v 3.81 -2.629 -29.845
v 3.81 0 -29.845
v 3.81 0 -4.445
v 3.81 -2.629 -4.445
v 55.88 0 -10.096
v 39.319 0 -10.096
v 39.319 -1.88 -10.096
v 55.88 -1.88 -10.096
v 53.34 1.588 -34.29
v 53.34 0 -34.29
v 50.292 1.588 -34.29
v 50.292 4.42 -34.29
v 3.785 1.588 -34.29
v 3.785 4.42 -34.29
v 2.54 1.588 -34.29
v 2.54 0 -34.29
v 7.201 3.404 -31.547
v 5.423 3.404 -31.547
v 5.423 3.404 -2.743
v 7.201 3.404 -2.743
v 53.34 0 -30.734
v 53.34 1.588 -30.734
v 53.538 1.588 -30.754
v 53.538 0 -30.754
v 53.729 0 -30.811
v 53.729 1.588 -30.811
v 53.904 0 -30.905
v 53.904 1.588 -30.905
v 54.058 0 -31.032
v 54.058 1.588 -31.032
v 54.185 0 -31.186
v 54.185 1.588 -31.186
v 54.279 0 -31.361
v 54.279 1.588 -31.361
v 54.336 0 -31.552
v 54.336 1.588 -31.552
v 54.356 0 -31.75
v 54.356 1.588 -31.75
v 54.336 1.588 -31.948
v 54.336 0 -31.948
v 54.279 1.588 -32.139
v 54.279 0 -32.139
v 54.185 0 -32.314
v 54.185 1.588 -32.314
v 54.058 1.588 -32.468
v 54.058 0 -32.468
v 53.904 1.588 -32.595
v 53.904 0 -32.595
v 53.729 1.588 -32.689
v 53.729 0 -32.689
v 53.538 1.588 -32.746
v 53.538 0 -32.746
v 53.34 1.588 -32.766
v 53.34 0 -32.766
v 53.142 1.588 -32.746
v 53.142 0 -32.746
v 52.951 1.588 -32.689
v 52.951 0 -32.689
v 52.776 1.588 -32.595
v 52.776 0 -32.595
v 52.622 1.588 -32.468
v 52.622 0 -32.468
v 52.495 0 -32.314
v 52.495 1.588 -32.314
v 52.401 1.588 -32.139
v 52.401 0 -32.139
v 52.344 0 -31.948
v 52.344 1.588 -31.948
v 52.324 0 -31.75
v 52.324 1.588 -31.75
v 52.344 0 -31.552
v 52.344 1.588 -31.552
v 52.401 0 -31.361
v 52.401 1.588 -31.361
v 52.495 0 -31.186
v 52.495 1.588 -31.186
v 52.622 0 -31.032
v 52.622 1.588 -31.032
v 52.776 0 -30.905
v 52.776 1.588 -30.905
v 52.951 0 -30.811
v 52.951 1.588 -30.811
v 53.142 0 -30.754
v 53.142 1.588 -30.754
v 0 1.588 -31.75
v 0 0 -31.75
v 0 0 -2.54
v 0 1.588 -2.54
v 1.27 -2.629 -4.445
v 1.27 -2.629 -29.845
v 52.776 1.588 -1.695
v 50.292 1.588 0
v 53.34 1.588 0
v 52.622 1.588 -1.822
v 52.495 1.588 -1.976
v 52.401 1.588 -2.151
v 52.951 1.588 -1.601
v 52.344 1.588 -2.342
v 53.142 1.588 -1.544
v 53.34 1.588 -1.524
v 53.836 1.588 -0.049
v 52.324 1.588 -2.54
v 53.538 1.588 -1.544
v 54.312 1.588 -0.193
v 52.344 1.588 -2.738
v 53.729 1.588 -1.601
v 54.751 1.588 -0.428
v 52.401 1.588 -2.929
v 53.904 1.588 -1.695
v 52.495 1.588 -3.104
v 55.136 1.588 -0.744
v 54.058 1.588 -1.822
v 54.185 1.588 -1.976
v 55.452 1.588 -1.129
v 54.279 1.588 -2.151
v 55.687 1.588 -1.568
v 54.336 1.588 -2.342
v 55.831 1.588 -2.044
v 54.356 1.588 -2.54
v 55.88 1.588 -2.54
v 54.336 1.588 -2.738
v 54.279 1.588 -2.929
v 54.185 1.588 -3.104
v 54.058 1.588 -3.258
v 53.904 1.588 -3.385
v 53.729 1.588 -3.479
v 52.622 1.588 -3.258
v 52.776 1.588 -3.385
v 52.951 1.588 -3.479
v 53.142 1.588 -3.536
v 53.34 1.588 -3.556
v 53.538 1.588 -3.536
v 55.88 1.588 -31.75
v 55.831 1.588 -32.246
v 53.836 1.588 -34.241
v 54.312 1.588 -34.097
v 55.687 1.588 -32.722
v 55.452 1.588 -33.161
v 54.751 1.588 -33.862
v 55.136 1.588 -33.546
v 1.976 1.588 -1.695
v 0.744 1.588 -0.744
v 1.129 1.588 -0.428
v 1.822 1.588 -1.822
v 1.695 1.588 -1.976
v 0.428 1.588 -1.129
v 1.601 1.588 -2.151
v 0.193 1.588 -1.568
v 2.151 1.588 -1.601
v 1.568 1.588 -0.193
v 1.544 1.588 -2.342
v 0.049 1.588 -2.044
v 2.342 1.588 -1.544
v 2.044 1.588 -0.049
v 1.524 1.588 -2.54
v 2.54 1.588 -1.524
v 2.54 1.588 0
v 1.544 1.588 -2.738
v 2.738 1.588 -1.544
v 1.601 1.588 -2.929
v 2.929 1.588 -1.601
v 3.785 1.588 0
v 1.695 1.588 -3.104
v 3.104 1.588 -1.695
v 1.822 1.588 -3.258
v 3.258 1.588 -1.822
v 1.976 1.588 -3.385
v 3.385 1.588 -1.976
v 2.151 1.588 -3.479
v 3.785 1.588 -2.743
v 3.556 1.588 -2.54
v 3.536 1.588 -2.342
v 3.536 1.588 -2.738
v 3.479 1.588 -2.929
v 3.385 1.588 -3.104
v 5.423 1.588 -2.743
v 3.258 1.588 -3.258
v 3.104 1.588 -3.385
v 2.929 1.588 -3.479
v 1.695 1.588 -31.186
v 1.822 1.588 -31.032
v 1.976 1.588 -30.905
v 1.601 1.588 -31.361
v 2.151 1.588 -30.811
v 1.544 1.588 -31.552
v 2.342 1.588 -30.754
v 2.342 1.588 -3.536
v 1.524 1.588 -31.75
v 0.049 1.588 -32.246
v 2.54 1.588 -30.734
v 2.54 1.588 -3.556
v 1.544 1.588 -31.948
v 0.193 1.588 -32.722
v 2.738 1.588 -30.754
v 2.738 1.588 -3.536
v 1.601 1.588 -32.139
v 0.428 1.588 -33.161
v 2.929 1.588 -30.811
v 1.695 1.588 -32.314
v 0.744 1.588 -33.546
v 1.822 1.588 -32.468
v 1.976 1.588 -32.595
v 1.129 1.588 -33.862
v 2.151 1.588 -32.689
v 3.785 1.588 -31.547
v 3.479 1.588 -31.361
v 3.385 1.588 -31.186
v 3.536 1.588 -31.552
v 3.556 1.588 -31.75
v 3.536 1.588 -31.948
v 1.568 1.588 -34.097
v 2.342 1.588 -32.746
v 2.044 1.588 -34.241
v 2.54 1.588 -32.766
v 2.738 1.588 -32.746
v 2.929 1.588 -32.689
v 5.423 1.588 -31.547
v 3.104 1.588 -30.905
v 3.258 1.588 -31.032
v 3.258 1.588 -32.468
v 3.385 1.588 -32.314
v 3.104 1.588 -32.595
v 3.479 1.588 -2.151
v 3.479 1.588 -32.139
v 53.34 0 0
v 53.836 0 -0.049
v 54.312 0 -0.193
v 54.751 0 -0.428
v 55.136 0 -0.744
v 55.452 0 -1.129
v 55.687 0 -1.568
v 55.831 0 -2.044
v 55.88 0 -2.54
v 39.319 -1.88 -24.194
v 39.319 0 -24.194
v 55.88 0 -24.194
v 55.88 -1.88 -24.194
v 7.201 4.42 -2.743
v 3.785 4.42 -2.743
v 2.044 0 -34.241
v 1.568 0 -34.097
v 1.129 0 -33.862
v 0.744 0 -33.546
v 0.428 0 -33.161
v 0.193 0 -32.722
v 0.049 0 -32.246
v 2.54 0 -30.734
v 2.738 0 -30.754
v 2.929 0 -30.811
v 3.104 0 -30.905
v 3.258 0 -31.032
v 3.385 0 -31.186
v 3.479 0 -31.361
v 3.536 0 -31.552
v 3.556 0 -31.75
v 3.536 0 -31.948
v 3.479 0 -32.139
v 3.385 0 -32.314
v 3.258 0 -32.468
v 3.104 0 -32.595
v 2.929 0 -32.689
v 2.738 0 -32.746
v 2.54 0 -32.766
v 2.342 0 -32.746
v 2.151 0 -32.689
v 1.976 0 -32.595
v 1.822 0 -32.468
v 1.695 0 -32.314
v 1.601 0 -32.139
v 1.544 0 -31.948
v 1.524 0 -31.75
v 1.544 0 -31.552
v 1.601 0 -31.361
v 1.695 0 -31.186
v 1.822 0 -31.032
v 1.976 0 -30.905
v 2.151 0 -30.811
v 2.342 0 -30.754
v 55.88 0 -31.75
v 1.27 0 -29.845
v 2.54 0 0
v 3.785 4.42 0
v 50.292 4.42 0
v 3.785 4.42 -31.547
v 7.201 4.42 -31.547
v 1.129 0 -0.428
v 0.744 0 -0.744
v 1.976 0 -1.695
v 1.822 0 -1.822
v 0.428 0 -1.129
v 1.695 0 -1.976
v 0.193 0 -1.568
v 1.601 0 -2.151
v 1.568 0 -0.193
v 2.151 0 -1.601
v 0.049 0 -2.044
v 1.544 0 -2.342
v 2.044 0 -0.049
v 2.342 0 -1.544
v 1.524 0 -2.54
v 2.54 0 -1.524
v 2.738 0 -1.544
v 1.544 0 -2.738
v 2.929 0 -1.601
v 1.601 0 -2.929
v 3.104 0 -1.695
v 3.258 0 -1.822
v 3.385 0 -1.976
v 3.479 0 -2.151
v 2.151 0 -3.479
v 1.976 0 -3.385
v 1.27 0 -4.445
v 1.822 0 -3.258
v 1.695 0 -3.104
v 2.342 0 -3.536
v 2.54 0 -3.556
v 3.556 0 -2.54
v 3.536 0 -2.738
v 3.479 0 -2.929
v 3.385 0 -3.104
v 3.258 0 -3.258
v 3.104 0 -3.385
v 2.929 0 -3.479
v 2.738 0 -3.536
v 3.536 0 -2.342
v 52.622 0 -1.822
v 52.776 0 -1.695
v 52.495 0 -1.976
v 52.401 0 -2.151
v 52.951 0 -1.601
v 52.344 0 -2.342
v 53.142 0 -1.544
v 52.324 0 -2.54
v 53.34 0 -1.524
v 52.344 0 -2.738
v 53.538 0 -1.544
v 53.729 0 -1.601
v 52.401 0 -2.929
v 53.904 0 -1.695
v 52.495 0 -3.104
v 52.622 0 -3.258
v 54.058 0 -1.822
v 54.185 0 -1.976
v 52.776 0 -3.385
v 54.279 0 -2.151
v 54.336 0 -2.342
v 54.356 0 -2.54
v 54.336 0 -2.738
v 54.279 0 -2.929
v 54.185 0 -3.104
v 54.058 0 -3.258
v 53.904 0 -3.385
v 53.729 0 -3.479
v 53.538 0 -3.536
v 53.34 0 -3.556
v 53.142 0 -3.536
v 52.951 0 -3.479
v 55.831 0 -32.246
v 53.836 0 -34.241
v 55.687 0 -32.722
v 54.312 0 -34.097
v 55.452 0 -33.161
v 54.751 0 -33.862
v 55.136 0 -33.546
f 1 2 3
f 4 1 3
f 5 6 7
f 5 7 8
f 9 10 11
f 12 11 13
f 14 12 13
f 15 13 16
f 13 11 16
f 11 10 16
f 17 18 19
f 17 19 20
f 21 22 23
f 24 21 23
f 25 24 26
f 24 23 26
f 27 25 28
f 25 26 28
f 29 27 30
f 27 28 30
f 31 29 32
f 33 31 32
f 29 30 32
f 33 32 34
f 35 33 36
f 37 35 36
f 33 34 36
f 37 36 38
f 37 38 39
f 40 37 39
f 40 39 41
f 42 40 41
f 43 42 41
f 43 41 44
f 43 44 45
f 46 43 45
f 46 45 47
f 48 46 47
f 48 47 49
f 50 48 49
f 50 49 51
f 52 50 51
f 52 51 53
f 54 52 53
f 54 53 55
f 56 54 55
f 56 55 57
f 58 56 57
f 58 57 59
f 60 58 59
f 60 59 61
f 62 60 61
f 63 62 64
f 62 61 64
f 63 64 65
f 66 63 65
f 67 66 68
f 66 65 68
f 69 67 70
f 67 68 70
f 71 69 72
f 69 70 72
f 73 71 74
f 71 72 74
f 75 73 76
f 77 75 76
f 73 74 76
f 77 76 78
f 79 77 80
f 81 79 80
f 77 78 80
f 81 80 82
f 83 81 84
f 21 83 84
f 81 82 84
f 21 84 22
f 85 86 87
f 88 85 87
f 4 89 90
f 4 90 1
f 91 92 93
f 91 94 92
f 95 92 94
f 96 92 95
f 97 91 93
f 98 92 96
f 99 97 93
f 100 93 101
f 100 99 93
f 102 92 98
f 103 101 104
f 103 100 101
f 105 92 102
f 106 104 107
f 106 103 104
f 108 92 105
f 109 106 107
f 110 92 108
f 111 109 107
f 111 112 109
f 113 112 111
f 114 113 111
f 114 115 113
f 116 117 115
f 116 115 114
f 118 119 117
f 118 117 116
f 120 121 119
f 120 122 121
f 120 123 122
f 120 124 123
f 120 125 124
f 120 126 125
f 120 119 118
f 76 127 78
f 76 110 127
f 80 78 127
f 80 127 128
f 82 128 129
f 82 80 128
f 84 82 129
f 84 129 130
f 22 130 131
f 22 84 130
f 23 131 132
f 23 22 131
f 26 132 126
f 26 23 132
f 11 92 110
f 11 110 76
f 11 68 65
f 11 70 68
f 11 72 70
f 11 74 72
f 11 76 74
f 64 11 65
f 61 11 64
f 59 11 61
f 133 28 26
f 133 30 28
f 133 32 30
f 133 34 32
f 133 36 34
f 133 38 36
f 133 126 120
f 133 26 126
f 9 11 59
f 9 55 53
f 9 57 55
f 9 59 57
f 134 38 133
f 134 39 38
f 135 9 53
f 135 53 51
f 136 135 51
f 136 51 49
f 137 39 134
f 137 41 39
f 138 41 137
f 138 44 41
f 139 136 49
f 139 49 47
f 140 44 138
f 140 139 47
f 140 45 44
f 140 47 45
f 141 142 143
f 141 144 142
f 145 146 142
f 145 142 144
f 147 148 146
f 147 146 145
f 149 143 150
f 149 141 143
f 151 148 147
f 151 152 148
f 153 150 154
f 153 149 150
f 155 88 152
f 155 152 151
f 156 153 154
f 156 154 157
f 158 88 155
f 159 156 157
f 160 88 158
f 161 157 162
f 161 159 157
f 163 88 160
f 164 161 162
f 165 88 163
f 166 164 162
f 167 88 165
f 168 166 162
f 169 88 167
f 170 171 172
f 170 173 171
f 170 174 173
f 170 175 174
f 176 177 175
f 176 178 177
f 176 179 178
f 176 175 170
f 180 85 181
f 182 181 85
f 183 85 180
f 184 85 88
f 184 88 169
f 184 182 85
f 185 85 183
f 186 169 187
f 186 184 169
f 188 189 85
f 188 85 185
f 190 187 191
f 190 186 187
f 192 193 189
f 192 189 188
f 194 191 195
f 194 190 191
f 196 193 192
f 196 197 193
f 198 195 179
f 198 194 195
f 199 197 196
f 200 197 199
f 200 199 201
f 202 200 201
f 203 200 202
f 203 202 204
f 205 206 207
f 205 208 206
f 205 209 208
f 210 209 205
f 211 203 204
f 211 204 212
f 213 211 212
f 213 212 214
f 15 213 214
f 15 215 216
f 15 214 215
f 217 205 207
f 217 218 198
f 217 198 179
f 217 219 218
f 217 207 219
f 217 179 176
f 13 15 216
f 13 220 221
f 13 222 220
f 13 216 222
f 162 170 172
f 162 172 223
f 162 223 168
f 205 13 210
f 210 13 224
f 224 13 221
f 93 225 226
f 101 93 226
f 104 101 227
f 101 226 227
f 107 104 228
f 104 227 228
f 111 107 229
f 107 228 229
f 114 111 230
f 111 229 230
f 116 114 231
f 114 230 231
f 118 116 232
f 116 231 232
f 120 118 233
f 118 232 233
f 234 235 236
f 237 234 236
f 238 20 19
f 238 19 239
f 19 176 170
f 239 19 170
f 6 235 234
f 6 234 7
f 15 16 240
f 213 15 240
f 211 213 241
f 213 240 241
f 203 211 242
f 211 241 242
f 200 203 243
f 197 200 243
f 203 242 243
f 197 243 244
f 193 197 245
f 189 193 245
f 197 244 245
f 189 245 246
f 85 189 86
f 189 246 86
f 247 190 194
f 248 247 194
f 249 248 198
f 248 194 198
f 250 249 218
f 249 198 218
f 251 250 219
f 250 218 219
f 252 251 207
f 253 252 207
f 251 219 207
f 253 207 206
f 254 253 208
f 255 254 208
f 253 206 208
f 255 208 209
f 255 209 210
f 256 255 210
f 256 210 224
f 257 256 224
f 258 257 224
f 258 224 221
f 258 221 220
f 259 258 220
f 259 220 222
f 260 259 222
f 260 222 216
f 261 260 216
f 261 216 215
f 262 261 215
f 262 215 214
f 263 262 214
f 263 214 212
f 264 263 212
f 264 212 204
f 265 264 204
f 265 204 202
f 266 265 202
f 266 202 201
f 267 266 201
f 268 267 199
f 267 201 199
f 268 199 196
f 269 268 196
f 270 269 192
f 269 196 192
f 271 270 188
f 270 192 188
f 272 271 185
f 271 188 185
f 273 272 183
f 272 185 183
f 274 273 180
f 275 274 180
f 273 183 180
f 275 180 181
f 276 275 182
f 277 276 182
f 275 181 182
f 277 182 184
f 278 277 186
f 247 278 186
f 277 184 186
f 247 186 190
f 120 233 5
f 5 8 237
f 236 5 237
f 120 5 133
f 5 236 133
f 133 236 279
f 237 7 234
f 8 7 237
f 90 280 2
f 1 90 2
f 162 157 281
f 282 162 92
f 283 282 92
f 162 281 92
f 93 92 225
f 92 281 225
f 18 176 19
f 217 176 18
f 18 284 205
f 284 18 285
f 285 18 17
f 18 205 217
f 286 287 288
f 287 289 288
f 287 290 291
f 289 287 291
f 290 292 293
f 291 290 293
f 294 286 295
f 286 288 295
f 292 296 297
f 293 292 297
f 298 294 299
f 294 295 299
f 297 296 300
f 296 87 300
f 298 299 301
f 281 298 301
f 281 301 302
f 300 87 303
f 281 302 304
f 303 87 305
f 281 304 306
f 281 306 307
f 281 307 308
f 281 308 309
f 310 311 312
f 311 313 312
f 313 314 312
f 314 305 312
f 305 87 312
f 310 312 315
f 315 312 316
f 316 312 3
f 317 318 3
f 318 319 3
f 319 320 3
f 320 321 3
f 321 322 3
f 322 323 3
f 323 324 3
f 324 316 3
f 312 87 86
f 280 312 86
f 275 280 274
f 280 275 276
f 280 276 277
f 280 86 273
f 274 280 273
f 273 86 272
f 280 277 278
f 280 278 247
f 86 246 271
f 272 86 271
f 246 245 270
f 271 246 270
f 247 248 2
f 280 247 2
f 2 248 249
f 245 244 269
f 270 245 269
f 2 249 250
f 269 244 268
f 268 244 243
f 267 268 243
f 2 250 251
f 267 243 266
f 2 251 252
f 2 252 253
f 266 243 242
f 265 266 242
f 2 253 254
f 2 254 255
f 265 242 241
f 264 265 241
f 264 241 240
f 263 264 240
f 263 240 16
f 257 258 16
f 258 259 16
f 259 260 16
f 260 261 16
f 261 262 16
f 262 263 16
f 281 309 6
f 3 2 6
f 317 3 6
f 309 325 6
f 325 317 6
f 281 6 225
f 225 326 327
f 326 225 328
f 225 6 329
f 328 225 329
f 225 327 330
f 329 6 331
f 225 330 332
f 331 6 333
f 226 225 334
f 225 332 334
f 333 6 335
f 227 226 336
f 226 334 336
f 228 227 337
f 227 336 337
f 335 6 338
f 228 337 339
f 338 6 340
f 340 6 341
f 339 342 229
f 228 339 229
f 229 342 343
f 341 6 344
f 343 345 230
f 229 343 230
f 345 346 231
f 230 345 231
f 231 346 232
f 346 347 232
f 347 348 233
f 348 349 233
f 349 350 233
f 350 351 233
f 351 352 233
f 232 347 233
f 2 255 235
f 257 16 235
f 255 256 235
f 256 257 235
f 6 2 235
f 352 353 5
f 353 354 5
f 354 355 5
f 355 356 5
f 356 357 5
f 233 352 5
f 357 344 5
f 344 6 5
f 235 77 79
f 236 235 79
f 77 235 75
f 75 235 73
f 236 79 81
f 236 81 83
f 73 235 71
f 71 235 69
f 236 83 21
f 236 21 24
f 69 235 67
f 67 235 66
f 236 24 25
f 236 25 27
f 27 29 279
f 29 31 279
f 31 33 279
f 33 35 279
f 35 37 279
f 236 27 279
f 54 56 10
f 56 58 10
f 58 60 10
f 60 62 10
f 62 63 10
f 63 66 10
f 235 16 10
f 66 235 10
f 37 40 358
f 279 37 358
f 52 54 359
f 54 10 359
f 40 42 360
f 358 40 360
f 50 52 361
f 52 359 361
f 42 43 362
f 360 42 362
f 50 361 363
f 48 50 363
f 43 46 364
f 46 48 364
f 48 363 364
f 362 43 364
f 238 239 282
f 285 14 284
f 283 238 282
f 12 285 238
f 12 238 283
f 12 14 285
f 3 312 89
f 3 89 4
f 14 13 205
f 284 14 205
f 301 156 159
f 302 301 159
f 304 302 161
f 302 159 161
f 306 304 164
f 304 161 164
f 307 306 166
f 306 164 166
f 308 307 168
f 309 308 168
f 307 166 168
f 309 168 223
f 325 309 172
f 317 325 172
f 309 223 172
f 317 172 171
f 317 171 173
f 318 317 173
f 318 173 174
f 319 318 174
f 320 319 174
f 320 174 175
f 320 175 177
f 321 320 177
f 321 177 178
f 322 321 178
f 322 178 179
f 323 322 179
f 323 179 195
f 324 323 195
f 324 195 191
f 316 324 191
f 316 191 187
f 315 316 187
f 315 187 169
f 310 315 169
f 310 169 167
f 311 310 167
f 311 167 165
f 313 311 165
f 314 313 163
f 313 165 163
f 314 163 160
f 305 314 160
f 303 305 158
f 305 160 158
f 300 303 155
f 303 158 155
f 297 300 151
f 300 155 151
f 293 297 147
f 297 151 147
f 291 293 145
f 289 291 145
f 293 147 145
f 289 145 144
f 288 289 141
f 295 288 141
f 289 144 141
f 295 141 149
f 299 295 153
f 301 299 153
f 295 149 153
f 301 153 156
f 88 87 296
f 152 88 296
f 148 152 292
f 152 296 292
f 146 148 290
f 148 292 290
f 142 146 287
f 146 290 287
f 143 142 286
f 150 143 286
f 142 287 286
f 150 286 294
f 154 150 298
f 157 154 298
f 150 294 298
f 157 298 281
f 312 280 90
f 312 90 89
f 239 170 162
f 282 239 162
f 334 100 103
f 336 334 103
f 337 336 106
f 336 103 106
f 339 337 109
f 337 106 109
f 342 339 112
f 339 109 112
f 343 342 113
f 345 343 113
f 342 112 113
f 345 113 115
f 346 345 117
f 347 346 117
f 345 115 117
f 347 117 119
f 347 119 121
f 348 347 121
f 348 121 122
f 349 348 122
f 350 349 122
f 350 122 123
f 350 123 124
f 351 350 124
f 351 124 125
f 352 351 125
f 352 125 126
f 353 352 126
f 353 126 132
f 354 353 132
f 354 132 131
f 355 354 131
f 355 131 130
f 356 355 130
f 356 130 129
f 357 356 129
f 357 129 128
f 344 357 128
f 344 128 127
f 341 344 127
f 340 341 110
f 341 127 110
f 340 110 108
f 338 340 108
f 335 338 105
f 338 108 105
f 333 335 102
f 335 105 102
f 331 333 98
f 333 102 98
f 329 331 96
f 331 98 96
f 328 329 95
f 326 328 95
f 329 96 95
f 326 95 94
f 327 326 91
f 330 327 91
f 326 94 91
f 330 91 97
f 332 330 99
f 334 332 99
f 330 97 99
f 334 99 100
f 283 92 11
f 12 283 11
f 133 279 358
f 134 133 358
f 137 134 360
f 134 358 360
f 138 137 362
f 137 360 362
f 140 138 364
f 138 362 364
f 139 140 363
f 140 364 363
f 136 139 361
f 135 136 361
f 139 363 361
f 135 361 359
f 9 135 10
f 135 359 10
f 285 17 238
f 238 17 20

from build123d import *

# Parameters (mm, degrees)
BOSS_EXTRUDE1_DEPTH = 1.5875
BOSS_EXTRUDE2_DEPTH = 2.8321
SKETCH3_W           = 1.778
SKETCH3_H           = 28.8036
BOSS_EXTRUDE3_DEPTH = 1.8161
SKETCH4_R           = 1.016
CUT_EXTRUDE1_DEPTH  = 66.623161235
SKETCH5_W           = 2.54
SKETCH5_H           = 25.4
BOSS_EXTRUDE4_DEPTH = 2.6289
SKETCH6_W           = 16.5608
SKETCH6_H           = 14.097
BOSS_EXTRUDE5_DEPTH = 1.8796


with BuildPart() as part:
    # Sketch1 → Boss-Extrude1 (new body)
    with BuildSketch(Plane(origin=(0, 0, 0), x_dir=(1, 0, 0), z_dir=(0, 1, 0))):
        with BuildLine():
            Line((2.54, 0), (53.34, 0))
            ThreePointArc((53.34, 0), (55.136051224, 0.743948776), (55.88, 2.54))
            Line((55.88, 2.54), (55.88, 31.75))
            ThreePointArc((55.88, 31.75), (55.136051224, 33.546051224), (53.34, 34.29))
            Line((53.34, 34.29), (2.54, 34.29))
            ThreePointArc((2.54, 34.29), (0.743948776, 33.546051224), (0, 31.75))
            Line((0, 31.75), (0, 2.54))
            ThreePointArc((0, 2.54), (0.743948776, 0.743948776), (2.54, 0))
        make_face()
    extrude(amount=BOSS_EXTRUDE1_DEPTH)

    # Sketch2 → Boss-Extrude2 (add)
    with BuildSketch(Plane(origin=(0, 1.5875, 0), x_dir=(1, 0, 0), z_dir=(0, 1, 0))):
        Polygon((50.292, 34.29), (3.7846, 34.29), (3.7846, 31.5468), (7.2009, 31.5468), (7.2009, 2.7432), (3.7846, 2.7432), (3.7846, 0), (50.292, 0), align=None)
    extrude(amount=BOSS_EXTRUDE2_DEPTH)

    # Sketch3 → Boss-Extrude3 (add)
    with BuildSketch(Plane(origin=(0, 1.5875, 0), x_dir=(1, 0, 0), z_dir=(0, 1, 0))):
        with Locations((6.3119, 17.145)):
            Rectangle(SKETCH3_W, SKETCH3_H)
    extrude(amount=BOSS_EXTRUDE3_DEPTH)

    # Sketch4 → Cut-Extrude1 (cut, through all)
    with BuildSketch(Plane(origin=(0, 1.5875, 0), x_dir=(1, 0, 0), z_dir=(0, 1, 0))):
        with Locations(Location((2.54, 31.75, 0), (0, 0, 270))):
            Circle(SKETCH4_R)
        with Locations(Location((2.54, 2.54, 0), (0, 0, 270))):
            Circle(SKETCH4_R)
        with Locations(Location((53.34, 31.75, 0), (0, 0, 270))):
            Circle(SKETCH4_R)
        with Locations(Location((53.34, 2.54, 0), (0, 0, 270))):
            Circle(SKETCH4_R)
    extrude(amount=-CUT_EXTRUDE1_DEPTH, mode=Mode.SUBTRACT)

    # Sketch5 → Boss-Extrude4 (add)
    with BuildSketch(Plane.XZ):
        with Locations((2.54, -17.145)):
            Rectangle(SKETCH5_W, SKETCH5_H)
    extrude(amount=BOSS_EXTRUDE4_DEPTH)

    # Sketch6 → Boss-Extrude5 (add)
    with BuildSketch(Plane.XZ):
        with Locations((47.5996, -17.145)):
            Rectangle(SKETCH6_W, SKETCH6_H)
    extrude(amount=BOSS_EXTRUDE5_DEPTH)


solid = part.part
